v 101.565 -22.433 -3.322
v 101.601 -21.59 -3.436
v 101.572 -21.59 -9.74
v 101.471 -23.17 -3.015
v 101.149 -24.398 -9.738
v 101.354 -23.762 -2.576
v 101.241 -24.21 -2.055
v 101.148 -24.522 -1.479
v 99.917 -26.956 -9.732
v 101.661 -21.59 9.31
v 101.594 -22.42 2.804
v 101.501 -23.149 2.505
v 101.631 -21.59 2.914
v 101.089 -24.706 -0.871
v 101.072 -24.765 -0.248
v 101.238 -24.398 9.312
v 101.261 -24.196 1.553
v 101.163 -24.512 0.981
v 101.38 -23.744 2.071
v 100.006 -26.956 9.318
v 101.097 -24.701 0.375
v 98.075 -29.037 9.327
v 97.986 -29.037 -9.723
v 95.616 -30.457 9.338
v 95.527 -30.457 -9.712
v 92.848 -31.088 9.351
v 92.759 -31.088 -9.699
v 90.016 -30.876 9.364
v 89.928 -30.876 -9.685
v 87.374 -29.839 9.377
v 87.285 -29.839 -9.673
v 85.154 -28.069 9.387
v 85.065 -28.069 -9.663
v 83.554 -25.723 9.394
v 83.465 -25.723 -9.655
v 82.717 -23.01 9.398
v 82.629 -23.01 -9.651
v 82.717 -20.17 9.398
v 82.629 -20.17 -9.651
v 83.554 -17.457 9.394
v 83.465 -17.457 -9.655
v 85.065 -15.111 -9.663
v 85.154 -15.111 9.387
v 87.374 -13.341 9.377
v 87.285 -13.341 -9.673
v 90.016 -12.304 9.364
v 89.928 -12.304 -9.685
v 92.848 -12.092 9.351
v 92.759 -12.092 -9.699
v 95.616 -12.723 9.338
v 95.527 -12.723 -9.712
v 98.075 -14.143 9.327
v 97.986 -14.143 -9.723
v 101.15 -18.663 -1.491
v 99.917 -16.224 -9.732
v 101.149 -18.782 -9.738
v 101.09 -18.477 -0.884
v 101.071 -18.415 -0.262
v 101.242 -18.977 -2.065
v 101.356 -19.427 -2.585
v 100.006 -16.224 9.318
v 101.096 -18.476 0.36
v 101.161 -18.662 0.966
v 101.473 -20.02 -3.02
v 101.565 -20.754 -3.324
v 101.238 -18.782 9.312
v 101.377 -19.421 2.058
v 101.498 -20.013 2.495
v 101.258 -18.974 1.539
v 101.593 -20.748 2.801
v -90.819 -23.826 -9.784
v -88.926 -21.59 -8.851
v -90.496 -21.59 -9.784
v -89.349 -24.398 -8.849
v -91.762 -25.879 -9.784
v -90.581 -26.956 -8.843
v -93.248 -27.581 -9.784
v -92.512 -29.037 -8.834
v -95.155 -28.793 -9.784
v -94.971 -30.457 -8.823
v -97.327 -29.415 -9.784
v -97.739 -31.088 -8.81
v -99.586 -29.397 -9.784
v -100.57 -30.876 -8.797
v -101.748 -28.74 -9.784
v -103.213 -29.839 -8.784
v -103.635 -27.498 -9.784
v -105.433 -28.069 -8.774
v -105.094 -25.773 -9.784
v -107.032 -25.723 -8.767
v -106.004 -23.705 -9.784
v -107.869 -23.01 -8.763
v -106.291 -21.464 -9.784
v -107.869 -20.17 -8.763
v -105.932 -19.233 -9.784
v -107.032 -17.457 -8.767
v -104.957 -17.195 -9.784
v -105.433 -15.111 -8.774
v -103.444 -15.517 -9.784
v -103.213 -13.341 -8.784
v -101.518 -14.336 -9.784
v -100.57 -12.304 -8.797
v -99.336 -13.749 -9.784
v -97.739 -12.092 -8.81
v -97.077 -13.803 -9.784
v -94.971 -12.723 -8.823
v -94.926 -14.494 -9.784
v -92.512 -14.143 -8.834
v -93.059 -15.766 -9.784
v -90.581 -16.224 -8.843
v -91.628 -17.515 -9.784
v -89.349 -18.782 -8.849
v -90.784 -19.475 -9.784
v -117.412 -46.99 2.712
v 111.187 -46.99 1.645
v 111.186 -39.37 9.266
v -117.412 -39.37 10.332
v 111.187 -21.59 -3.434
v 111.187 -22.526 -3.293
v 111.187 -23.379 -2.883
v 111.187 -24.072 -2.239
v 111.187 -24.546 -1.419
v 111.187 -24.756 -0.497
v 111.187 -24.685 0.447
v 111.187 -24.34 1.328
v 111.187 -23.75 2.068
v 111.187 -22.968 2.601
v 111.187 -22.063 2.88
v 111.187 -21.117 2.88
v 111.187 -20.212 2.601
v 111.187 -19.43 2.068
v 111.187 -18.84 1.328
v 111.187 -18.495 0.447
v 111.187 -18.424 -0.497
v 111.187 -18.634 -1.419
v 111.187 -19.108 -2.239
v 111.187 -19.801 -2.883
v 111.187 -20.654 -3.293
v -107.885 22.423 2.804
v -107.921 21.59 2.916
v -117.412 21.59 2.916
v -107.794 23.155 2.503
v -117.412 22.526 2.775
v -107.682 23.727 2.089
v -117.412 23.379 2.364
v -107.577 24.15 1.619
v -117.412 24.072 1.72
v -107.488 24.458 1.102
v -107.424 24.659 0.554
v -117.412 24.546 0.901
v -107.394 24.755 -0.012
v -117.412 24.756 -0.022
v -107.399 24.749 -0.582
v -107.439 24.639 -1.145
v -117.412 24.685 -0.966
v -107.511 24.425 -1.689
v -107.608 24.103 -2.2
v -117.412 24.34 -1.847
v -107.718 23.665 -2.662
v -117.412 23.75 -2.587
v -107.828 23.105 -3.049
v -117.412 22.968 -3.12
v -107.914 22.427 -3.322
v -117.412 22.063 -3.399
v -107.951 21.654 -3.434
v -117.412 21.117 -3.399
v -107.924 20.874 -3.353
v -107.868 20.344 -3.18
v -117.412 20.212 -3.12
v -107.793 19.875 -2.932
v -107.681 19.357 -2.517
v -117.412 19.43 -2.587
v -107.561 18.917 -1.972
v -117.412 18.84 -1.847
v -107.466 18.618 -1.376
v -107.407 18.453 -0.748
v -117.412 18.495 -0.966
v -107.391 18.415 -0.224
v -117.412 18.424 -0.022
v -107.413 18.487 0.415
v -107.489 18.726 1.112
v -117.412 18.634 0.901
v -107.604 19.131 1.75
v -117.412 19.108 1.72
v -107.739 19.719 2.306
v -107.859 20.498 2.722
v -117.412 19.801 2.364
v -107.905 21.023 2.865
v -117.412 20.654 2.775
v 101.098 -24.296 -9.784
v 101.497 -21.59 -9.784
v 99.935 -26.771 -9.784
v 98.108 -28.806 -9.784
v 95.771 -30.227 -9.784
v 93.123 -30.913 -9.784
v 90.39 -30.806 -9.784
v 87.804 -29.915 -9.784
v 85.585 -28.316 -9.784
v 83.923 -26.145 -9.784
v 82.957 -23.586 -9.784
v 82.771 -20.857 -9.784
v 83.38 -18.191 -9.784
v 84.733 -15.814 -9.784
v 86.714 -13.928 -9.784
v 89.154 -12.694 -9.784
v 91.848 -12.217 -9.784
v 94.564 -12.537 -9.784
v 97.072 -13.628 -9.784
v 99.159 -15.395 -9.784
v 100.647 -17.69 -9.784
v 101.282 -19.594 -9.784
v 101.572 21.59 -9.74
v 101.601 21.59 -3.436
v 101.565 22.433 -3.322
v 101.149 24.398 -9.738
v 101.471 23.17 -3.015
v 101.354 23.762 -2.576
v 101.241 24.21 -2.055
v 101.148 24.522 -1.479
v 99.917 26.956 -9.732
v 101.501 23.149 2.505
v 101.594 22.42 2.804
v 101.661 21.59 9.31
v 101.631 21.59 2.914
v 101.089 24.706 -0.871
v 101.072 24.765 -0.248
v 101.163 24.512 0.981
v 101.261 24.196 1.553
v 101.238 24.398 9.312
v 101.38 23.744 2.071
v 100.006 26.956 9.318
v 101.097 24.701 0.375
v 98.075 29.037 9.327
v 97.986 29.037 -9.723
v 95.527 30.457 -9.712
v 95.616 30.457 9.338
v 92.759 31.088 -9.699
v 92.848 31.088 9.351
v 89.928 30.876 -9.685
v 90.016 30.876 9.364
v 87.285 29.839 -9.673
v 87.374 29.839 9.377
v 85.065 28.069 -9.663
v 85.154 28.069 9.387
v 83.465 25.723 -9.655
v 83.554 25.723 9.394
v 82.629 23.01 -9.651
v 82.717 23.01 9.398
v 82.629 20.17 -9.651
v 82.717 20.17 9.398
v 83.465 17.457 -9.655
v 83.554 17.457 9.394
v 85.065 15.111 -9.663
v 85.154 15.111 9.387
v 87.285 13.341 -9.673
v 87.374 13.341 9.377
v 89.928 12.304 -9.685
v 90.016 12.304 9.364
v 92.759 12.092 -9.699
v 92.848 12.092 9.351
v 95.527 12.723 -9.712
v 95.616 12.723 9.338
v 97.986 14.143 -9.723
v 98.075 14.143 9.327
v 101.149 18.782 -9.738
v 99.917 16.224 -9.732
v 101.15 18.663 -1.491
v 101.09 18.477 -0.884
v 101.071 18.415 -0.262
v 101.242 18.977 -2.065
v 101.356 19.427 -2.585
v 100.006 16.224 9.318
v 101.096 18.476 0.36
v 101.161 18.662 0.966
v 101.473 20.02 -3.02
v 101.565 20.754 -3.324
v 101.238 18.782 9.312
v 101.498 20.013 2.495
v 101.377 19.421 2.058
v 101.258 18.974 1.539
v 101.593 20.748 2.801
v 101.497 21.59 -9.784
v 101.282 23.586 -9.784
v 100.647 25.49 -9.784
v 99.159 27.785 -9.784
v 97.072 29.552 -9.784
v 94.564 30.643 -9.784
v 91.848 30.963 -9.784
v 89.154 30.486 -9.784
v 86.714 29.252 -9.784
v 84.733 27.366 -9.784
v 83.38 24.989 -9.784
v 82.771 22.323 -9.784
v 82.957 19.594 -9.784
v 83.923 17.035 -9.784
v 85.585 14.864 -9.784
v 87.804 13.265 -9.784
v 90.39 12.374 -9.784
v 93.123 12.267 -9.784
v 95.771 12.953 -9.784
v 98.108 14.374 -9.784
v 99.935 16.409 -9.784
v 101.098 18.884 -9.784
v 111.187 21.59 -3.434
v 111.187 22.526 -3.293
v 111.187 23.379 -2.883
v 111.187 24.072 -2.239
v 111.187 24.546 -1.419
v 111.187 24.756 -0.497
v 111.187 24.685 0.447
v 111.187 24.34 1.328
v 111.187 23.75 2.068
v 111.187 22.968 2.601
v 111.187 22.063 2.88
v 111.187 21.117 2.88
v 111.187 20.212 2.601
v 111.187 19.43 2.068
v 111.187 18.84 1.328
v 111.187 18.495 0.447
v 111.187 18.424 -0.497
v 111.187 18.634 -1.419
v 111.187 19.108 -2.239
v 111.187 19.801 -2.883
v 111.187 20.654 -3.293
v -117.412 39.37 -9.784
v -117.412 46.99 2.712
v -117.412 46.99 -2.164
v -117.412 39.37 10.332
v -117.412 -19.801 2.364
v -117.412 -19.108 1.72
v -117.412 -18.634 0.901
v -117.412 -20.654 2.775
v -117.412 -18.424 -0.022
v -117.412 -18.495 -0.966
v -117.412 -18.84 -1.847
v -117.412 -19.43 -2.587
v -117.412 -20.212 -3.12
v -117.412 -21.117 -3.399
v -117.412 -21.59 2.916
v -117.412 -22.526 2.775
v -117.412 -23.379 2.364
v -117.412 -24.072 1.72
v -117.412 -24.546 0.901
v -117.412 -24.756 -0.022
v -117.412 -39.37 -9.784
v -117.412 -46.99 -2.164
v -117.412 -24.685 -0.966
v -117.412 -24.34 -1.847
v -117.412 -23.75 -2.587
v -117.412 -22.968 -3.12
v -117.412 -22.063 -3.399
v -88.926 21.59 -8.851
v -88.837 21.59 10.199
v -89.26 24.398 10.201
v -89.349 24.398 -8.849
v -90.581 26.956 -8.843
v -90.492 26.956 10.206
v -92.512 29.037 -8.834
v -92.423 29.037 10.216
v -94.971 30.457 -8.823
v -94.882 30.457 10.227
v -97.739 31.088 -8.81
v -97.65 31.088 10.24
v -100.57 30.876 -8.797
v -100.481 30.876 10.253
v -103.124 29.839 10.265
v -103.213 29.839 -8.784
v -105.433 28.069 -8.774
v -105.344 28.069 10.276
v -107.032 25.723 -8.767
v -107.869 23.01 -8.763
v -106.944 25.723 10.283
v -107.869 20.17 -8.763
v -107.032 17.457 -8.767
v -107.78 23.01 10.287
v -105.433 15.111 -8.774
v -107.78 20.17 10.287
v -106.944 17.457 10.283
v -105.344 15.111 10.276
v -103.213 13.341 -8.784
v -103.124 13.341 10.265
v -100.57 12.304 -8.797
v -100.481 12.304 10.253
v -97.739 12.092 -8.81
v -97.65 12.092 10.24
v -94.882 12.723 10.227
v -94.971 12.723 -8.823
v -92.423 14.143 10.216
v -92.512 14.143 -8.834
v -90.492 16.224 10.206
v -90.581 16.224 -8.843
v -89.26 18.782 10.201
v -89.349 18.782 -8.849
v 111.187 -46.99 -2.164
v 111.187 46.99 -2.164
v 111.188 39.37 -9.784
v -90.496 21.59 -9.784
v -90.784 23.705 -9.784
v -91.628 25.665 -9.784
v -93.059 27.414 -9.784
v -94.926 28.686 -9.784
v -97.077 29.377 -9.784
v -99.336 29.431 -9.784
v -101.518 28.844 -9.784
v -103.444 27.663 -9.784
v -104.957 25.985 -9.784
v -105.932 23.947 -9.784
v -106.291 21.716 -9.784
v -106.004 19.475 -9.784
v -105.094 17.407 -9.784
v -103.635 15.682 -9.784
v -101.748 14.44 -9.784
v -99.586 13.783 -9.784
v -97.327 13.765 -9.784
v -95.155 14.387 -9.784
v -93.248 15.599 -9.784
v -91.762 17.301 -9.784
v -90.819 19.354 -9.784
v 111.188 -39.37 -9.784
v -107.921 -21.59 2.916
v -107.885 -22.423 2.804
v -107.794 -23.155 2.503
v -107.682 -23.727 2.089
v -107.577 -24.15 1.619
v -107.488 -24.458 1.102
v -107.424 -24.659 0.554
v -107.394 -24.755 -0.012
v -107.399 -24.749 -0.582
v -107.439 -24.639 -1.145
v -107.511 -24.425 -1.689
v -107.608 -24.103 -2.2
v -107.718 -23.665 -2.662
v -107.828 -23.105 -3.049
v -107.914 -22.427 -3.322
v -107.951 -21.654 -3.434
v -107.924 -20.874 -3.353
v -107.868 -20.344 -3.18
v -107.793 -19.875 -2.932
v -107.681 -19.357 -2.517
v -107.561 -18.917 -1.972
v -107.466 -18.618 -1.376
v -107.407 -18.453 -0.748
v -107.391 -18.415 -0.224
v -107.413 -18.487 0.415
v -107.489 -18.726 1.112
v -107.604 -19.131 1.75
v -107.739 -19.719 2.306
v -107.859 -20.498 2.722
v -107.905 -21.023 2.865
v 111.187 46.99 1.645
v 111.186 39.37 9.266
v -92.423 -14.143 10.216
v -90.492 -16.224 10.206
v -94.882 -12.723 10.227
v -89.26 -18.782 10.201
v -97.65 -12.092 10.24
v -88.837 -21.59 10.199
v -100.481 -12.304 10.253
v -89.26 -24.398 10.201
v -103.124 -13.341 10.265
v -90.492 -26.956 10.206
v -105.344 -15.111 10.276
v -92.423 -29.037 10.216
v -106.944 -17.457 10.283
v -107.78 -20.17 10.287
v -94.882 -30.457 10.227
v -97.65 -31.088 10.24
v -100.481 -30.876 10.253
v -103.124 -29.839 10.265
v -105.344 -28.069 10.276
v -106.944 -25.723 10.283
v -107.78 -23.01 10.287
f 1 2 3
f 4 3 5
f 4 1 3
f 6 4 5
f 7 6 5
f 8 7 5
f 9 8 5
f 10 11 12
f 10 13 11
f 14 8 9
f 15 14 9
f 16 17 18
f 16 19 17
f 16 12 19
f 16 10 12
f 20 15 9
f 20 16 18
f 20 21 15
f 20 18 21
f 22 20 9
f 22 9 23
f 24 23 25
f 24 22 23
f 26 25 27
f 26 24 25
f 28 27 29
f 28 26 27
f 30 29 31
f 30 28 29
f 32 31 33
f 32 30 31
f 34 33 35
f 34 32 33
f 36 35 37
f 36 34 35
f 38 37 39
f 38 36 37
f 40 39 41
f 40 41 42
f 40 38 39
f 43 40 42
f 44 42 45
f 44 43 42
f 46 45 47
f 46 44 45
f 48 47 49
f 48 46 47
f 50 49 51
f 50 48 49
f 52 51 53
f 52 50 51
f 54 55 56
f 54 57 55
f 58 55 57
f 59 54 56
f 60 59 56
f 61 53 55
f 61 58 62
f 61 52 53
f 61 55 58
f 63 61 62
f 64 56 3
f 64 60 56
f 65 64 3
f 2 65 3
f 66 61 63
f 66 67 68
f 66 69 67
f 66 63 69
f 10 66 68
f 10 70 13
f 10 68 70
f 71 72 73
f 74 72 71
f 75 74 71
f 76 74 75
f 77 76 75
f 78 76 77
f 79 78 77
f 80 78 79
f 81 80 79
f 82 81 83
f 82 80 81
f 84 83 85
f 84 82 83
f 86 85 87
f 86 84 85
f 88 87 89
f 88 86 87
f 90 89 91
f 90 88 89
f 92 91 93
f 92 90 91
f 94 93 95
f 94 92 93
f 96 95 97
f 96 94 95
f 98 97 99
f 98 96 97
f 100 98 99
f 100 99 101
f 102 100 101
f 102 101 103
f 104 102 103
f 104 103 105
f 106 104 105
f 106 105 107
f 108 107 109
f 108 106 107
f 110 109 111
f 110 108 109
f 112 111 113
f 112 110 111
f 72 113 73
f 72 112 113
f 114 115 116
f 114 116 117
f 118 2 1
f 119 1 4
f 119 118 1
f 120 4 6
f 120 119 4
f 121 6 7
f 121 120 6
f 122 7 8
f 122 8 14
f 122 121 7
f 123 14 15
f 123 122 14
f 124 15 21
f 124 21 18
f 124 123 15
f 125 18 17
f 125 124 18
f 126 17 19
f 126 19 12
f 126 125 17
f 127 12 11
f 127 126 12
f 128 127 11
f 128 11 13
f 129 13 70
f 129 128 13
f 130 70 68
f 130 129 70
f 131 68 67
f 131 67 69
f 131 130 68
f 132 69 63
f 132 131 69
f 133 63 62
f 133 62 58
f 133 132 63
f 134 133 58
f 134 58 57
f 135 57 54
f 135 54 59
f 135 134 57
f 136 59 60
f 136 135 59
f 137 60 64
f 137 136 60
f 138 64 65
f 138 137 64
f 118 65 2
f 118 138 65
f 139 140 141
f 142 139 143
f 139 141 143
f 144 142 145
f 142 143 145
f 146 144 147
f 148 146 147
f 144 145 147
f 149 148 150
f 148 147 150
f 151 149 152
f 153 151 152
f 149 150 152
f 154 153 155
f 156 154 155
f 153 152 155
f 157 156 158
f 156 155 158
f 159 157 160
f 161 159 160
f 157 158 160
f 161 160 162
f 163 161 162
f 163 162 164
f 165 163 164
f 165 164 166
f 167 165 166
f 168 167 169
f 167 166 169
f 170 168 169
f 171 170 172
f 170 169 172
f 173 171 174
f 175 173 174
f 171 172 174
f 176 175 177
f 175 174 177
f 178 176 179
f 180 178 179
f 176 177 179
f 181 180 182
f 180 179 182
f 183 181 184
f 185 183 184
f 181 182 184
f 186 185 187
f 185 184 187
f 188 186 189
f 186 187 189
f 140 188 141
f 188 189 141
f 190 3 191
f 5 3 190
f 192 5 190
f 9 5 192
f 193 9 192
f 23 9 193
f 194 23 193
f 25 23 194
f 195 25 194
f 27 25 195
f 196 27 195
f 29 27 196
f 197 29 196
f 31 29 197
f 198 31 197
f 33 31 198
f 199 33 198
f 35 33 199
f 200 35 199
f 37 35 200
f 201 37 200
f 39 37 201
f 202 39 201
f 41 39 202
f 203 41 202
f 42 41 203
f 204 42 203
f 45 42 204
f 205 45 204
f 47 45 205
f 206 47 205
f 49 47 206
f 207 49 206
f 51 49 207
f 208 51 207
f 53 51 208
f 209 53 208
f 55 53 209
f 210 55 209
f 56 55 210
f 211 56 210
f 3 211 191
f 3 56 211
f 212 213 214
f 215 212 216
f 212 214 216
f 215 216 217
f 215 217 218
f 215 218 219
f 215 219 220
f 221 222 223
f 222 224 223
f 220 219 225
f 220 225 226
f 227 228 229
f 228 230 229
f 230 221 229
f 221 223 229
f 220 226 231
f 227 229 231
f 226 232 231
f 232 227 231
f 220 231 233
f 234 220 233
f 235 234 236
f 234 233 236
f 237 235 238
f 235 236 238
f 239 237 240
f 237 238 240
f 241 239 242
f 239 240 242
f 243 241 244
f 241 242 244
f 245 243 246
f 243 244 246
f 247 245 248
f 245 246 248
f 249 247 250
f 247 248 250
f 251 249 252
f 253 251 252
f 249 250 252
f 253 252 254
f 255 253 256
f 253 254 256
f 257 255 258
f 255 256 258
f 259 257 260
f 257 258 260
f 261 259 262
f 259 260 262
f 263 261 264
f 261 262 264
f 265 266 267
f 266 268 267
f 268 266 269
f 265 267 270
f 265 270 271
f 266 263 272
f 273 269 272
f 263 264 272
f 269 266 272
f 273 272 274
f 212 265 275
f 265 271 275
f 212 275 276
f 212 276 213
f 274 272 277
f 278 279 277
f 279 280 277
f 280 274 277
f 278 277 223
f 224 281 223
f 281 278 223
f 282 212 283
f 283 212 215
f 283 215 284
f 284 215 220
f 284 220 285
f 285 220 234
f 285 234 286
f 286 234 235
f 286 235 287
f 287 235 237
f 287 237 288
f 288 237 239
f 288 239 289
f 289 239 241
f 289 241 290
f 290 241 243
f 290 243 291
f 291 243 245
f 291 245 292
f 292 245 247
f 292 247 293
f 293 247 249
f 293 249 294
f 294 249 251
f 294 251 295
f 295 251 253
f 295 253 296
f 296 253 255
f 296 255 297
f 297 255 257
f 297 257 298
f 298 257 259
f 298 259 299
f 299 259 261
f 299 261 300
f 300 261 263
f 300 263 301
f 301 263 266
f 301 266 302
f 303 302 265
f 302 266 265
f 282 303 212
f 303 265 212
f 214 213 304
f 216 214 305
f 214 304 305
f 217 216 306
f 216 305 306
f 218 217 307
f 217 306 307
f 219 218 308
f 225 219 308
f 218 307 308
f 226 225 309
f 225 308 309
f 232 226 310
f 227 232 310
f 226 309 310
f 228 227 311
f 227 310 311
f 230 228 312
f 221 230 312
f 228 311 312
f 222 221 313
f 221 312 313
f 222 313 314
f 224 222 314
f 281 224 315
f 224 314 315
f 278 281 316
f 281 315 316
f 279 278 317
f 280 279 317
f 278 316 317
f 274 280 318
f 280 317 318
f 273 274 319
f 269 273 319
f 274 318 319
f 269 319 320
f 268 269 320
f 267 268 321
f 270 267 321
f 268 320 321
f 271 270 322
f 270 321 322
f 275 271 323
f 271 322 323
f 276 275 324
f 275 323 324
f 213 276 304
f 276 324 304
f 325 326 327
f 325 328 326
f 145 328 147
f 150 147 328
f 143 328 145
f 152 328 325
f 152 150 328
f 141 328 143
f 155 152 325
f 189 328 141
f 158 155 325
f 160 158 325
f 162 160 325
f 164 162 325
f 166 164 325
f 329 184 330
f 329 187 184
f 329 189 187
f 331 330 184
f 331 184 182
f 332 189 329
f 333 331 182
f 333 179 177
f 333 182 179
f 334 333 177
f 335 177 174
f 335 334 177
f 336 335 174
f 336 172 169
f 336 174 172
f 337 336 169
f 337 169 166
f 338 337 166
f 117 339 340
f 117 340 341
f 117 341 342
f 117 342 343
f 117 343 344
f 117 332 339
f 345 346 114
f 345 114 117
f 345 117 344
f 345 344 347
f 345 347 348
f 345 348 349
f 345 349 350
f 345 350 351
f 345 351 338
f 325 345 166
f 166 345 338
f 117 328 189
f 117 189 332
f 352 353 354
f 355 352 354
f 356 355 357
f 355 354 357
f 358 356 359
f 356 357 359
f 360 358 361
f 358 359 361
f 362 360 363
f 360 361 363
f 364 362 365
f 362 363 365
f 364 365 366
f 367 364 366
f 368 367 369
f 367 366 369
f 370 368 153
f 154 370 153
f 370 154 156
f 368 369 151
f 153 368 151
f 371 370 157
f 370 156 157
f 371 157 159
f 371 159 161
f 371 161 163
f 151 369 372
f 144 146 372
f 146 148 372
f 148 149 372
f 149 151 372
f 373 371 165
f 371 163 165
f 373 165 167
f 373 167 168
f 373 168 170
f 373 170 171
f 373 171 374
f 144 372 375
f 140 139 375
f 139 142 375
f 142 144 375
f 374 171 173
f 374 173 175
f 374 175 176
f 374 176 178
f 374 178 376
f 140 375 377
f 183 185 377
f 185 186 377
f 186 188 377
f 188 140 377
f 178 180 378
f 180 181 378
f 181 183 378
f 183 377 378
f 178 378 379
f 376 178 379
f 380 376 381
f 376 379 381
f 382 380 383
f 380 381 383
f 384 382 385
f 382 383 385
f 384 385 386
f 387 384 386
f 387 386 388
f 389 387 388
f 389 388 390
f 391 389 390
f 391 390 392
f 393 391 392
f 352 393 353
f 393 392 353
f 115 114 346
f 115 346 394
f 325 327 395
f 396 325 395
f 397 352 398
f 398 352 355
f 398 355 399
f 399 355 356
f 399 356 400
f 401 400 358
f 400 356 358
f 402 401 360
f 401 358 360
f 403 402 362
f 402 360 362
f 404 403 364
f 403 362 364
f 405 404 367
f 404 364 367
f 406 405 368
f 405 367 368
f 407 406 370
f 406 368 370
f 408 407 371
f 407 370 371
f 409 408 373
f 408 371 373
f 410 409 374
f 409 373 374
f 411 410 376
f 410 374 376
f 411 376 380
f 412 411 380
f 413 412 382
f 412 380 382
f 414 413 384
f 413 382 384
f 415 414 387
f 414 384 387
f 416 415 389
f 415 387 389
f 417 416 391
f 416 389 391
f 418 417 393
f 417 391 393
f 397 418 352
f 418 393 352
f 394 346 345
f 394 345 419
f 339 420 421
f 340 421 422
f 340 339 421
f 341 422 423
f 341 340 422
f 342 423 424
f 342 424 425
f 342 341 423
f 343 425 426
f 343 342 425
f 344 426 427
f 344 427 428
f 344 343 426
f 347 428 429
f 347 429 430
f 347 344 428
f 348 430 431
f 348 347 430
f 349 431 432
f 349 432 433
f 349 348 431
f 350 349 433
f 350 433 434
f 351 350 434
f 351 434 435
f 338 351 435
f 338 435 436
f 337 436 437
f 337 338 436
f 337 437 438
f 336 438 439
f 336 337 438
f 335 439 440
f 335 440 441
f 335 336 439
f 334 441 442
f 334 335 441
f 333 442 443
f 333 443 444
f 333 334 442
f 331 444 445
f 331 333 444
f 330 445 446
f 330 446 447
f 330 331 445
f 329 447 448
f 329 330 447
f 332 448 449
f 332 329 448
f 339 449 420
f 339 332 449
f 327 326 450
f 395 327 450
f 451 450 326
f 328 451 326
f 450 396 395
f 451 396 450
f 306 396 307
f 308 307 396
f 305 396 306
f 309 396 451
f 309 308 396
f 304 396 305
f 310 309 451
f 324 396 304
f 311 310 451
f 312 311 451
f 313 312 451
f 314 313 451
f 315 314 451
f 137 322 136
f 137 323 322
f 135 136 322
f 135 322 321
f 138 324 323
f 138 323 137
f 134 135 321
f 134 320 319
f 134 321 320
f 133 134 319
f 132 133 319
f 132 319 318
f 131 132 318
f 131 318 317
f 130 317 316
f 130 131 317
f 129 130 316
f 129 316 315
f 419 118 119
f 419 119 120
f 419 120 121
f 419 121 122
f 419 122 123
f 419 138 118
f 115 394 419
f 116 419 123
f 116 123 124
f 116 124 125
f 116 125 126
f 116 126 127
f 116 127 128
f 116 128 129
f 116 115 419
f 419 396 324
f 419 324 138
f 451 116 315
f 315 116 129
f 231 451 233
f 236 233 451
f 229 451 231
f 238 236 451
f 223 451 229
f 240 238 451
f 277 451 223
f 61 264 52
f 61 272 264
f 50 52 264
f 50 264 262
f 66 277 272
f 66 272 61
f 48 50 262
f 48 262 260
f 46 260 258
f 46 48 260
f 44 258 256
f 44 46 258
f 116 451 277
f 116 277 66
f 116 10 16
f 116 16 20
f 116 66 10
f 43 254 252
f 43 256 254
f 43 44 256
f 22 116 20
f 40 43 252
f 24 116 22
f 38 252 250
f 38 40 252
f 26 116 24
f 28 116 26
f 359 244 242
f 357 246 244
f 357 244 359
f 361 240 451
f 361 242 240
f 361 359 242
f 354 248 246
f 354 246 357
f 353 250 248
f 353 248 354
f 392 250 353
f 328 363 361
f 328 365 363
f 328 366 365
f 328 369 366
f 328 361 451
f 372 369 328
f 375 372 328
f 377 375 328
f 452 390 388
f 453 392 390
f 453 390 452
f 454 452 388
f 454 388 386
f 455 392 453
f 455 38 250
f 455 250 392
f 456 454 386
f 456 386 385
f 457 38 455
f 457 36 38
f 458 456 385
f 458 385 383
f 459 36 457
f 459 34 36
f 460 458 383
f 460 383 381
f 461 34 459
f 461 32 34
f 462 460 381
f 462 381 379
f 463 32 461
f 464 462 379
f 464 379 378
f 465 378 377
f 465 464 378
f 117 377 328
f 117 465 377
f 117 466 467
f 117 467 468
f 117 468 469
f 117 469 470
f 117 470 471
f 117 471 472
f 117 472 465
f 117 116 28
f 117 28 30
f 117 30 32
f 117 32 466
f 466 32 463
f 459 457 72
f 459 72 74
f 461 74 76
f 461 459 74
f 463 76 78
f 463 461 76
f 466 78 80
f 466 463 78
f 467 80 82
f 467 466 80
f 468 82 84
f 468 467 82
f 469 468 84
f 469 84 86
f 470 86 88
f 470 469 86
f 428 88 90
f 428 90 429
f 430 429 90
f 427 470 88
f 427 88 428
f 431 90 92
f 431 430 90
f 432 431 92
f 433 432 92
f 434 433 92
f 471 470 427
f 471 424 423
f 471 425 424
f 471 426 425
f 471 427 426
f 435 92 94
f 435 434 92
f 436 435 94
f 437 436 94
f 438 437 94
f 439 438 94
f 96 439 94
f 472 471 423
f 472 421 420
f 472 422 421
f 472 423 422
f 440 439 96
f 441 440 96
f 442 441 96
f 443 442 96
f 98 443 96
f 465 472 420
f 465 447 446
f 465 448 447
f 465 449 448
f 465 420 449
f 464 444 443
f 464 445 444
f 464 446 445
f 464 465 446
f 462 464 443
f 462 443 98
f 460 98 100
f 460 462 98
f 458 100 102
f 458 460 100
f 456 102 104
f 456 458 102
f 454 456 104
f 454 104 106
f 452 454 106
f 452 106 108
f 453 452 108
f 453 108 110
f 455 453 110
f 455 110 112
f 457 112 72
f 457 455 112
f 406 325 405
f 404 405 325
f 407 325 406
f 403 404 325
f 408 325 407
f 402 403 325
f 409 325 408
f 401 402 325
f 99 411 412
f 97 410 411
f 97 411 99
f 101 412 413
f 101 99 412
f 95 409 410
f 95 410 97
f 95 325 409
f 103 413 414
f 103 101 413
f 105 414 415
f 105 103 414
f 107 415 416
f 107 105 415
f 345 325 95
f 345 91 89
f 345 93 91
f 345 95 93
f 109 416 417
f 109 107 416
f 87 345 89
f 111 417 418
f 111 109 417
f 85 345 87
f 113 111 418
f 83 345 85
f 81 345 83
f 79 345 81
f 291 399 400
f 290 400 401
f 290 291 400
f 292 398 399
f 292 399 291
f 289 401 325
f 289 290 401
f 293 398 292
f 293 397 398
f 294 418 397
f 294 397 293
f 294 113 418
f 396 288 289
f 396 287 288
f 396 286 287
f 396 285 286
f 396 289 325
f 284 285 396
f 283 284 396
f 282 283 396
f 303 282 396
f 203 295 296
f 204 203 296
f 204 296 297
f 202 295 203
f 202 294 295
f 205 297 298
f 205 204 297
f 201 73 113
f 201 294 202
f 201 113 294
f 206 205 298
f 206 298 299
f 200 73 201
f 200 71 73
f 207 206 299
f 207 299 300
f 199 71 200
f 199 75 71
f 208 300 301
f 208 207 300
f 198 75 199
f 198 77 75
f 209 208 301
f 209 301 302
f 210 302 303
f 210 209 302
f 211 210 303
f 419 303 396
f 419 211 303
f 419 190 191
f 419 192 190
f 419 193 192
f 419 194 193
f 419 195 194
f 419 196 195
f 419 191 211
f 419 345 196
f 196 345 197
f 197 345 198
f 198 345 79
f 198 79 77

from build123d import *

# Parameters (mm, degrees)
BOSS_EXTRUDE3_DEPTH                  = 46.99
CHAMFER1_SIZE                        = 7.62
F_3_4_0_75_DIAMETER_HOLE1_AT_2_COUNT = 2
F_3_4_0_75_DIAMETER_HOLE1_AT_2_PITCH = 190.5


with BuildPart() as part:
    # 3DSketch2 → Boss-Extrude3 (new, symmetric)
    with BuildSketch(Plane(origin=(-117.411769765, 0, -9.784420547), x_dir=(0.9965456835069088, 0, 0.08304637670451492), z_dir=(0, -1, 0))):
        Polygon((0, 0), (227.81034325, -18.984401715), (229.389897471, 0), (1.670602813, 20.047015755), align=None)
    extrude(amount=BOSS_EXTRUDE3_DEPTH, both=True)

    # Chamfer1
    chamfer1_edges = [part.edges().sort_by_distance(p)[0] for p in [
        (-3.111769765, 46.99, -9.784420547),
        (-3.113013683, -46.99, 9.798831636),
        (-3.111769765, -46.99, -9.784420547),
        (-3.113013683, 46.99, 9.798831636),
    ]]
    chamfer(chamfer1_edges, length=CHAMFER1_SIZE)

    # Sketch3 → 3/4 (0.75) Diameter Hole1 (revolve, cut)
    with BuildSketch(Plane(origin=(92.135949719, -21.59, 9.354454682), x_dir=(0.9999891170795402, 0, -0.0046653748490357765), z_dir=(0, 1, 0))):
        Polygon((0, 0), (0, 24.773197396), (9.525, 19.05), (9.525, 0), align=None)
    f_3_4_0_75_diameter_hole1 = revolve(axis=Axis((92.165574849, -21.59, 15.704385575), (-0.004665374849035791, 0, -0.9999891170795401)), mode=Mode.SUBTRACT)

    # 3/4 (0.75) Diameter Hole1 at 2: 3/4 (0.75) Diameter Hole1 ×2
    with Locations(*[Vector(-0.9999891170795401, 0, 0.004665374849035796) * (i * F_3_4_0_75_DIAMETER_HOLE1_AT_2_PITCH) for i in range(1, F_3_4_0_75_DIAMETER_HOLE1_AT_2_COUNT)]):
        add(f_3_4_0_75_diameter_hole1, mode=Mode.SUBTRACT)

    # Sketch5 → 1/4 (0.25) Diameter Hole1 (revolve, cut)
    with BuildSketch(Plane(origin=(111.186986317, -21.59, -0.259420628), x_dir=(0.00013059504552427994, 0, -0.9999999914724671), z_dir=(0, 1, 0))):
        Polygon((0, 0), (0, 20.957732465), (3.175, 19.05), (3.175, 0), align=None)
    f_1_4_0_25_diameter_hole1 = revolve(axis=Axis((117.536986263, -21.59, -0.258591349), (-0.9999999914724671, 0, -0.00013059504552427964)), mode=Mode.SUBTRACT)

    # Sketch7 → 1/4 (0.25) Diameter Hole2 (revolve, cut)
    with BuildSketch(Plane(origin=(-117.411769765, -21.59, -0.259420547), x_dir=(0, 0, 1), z_dir=(0, 1, 0))):
        Polygon((0, 0), (0, 20.957732465), (3.175, 19.05), (3.175, 0), align=None)
    f_1_4_0_25_diameter_hole2 = revolve(axis=Axis((-123.761769765, -21.59, -0.259420547), (1, 0, 0)), mode=Mode.SUBTRACT)

    # Mirror9: 3/4 (0.75) Diameter Hole1, 1/4 (0.25) Diameter Hole1, 1/4 (0.25) Diameter Hole2 across plane
    add(f_3_4_0_75_diameter_hole1.mirror(Plane.ZX), mode=Mode.SUBTRACT)
    add(f_1_4_0_25_diameter_hole1.mirror(Plane.ZX), mode=Mode.SUBTRACT)
    add(f_1_4_0_25_diameter_hole2.mirror(Plane.ZX), mode=Mode.SUBTRACT)

    # Mirror9 copy 1 sketch → Mirror9 copy 1 (revolve, cut)
    with BuildSketch(Plane(origin=(-98.361977085, 21.59, 10.24320859), x_dir=(0.9999891170795402, 0, -0.0046653748490357765), z_dir=(0, -1, 0))):
        Polygon((0, 0), (0, -24.773197396), (9.525, -19.05), (9.525, 0), align=None)
    revolve(axis=Axis((-98.332351955, 21.59, 16.593139484), (0.004665374849035791, 0, 0.9999891170795401)), mode=Mode.SUBTRACT)


solid = part.part
